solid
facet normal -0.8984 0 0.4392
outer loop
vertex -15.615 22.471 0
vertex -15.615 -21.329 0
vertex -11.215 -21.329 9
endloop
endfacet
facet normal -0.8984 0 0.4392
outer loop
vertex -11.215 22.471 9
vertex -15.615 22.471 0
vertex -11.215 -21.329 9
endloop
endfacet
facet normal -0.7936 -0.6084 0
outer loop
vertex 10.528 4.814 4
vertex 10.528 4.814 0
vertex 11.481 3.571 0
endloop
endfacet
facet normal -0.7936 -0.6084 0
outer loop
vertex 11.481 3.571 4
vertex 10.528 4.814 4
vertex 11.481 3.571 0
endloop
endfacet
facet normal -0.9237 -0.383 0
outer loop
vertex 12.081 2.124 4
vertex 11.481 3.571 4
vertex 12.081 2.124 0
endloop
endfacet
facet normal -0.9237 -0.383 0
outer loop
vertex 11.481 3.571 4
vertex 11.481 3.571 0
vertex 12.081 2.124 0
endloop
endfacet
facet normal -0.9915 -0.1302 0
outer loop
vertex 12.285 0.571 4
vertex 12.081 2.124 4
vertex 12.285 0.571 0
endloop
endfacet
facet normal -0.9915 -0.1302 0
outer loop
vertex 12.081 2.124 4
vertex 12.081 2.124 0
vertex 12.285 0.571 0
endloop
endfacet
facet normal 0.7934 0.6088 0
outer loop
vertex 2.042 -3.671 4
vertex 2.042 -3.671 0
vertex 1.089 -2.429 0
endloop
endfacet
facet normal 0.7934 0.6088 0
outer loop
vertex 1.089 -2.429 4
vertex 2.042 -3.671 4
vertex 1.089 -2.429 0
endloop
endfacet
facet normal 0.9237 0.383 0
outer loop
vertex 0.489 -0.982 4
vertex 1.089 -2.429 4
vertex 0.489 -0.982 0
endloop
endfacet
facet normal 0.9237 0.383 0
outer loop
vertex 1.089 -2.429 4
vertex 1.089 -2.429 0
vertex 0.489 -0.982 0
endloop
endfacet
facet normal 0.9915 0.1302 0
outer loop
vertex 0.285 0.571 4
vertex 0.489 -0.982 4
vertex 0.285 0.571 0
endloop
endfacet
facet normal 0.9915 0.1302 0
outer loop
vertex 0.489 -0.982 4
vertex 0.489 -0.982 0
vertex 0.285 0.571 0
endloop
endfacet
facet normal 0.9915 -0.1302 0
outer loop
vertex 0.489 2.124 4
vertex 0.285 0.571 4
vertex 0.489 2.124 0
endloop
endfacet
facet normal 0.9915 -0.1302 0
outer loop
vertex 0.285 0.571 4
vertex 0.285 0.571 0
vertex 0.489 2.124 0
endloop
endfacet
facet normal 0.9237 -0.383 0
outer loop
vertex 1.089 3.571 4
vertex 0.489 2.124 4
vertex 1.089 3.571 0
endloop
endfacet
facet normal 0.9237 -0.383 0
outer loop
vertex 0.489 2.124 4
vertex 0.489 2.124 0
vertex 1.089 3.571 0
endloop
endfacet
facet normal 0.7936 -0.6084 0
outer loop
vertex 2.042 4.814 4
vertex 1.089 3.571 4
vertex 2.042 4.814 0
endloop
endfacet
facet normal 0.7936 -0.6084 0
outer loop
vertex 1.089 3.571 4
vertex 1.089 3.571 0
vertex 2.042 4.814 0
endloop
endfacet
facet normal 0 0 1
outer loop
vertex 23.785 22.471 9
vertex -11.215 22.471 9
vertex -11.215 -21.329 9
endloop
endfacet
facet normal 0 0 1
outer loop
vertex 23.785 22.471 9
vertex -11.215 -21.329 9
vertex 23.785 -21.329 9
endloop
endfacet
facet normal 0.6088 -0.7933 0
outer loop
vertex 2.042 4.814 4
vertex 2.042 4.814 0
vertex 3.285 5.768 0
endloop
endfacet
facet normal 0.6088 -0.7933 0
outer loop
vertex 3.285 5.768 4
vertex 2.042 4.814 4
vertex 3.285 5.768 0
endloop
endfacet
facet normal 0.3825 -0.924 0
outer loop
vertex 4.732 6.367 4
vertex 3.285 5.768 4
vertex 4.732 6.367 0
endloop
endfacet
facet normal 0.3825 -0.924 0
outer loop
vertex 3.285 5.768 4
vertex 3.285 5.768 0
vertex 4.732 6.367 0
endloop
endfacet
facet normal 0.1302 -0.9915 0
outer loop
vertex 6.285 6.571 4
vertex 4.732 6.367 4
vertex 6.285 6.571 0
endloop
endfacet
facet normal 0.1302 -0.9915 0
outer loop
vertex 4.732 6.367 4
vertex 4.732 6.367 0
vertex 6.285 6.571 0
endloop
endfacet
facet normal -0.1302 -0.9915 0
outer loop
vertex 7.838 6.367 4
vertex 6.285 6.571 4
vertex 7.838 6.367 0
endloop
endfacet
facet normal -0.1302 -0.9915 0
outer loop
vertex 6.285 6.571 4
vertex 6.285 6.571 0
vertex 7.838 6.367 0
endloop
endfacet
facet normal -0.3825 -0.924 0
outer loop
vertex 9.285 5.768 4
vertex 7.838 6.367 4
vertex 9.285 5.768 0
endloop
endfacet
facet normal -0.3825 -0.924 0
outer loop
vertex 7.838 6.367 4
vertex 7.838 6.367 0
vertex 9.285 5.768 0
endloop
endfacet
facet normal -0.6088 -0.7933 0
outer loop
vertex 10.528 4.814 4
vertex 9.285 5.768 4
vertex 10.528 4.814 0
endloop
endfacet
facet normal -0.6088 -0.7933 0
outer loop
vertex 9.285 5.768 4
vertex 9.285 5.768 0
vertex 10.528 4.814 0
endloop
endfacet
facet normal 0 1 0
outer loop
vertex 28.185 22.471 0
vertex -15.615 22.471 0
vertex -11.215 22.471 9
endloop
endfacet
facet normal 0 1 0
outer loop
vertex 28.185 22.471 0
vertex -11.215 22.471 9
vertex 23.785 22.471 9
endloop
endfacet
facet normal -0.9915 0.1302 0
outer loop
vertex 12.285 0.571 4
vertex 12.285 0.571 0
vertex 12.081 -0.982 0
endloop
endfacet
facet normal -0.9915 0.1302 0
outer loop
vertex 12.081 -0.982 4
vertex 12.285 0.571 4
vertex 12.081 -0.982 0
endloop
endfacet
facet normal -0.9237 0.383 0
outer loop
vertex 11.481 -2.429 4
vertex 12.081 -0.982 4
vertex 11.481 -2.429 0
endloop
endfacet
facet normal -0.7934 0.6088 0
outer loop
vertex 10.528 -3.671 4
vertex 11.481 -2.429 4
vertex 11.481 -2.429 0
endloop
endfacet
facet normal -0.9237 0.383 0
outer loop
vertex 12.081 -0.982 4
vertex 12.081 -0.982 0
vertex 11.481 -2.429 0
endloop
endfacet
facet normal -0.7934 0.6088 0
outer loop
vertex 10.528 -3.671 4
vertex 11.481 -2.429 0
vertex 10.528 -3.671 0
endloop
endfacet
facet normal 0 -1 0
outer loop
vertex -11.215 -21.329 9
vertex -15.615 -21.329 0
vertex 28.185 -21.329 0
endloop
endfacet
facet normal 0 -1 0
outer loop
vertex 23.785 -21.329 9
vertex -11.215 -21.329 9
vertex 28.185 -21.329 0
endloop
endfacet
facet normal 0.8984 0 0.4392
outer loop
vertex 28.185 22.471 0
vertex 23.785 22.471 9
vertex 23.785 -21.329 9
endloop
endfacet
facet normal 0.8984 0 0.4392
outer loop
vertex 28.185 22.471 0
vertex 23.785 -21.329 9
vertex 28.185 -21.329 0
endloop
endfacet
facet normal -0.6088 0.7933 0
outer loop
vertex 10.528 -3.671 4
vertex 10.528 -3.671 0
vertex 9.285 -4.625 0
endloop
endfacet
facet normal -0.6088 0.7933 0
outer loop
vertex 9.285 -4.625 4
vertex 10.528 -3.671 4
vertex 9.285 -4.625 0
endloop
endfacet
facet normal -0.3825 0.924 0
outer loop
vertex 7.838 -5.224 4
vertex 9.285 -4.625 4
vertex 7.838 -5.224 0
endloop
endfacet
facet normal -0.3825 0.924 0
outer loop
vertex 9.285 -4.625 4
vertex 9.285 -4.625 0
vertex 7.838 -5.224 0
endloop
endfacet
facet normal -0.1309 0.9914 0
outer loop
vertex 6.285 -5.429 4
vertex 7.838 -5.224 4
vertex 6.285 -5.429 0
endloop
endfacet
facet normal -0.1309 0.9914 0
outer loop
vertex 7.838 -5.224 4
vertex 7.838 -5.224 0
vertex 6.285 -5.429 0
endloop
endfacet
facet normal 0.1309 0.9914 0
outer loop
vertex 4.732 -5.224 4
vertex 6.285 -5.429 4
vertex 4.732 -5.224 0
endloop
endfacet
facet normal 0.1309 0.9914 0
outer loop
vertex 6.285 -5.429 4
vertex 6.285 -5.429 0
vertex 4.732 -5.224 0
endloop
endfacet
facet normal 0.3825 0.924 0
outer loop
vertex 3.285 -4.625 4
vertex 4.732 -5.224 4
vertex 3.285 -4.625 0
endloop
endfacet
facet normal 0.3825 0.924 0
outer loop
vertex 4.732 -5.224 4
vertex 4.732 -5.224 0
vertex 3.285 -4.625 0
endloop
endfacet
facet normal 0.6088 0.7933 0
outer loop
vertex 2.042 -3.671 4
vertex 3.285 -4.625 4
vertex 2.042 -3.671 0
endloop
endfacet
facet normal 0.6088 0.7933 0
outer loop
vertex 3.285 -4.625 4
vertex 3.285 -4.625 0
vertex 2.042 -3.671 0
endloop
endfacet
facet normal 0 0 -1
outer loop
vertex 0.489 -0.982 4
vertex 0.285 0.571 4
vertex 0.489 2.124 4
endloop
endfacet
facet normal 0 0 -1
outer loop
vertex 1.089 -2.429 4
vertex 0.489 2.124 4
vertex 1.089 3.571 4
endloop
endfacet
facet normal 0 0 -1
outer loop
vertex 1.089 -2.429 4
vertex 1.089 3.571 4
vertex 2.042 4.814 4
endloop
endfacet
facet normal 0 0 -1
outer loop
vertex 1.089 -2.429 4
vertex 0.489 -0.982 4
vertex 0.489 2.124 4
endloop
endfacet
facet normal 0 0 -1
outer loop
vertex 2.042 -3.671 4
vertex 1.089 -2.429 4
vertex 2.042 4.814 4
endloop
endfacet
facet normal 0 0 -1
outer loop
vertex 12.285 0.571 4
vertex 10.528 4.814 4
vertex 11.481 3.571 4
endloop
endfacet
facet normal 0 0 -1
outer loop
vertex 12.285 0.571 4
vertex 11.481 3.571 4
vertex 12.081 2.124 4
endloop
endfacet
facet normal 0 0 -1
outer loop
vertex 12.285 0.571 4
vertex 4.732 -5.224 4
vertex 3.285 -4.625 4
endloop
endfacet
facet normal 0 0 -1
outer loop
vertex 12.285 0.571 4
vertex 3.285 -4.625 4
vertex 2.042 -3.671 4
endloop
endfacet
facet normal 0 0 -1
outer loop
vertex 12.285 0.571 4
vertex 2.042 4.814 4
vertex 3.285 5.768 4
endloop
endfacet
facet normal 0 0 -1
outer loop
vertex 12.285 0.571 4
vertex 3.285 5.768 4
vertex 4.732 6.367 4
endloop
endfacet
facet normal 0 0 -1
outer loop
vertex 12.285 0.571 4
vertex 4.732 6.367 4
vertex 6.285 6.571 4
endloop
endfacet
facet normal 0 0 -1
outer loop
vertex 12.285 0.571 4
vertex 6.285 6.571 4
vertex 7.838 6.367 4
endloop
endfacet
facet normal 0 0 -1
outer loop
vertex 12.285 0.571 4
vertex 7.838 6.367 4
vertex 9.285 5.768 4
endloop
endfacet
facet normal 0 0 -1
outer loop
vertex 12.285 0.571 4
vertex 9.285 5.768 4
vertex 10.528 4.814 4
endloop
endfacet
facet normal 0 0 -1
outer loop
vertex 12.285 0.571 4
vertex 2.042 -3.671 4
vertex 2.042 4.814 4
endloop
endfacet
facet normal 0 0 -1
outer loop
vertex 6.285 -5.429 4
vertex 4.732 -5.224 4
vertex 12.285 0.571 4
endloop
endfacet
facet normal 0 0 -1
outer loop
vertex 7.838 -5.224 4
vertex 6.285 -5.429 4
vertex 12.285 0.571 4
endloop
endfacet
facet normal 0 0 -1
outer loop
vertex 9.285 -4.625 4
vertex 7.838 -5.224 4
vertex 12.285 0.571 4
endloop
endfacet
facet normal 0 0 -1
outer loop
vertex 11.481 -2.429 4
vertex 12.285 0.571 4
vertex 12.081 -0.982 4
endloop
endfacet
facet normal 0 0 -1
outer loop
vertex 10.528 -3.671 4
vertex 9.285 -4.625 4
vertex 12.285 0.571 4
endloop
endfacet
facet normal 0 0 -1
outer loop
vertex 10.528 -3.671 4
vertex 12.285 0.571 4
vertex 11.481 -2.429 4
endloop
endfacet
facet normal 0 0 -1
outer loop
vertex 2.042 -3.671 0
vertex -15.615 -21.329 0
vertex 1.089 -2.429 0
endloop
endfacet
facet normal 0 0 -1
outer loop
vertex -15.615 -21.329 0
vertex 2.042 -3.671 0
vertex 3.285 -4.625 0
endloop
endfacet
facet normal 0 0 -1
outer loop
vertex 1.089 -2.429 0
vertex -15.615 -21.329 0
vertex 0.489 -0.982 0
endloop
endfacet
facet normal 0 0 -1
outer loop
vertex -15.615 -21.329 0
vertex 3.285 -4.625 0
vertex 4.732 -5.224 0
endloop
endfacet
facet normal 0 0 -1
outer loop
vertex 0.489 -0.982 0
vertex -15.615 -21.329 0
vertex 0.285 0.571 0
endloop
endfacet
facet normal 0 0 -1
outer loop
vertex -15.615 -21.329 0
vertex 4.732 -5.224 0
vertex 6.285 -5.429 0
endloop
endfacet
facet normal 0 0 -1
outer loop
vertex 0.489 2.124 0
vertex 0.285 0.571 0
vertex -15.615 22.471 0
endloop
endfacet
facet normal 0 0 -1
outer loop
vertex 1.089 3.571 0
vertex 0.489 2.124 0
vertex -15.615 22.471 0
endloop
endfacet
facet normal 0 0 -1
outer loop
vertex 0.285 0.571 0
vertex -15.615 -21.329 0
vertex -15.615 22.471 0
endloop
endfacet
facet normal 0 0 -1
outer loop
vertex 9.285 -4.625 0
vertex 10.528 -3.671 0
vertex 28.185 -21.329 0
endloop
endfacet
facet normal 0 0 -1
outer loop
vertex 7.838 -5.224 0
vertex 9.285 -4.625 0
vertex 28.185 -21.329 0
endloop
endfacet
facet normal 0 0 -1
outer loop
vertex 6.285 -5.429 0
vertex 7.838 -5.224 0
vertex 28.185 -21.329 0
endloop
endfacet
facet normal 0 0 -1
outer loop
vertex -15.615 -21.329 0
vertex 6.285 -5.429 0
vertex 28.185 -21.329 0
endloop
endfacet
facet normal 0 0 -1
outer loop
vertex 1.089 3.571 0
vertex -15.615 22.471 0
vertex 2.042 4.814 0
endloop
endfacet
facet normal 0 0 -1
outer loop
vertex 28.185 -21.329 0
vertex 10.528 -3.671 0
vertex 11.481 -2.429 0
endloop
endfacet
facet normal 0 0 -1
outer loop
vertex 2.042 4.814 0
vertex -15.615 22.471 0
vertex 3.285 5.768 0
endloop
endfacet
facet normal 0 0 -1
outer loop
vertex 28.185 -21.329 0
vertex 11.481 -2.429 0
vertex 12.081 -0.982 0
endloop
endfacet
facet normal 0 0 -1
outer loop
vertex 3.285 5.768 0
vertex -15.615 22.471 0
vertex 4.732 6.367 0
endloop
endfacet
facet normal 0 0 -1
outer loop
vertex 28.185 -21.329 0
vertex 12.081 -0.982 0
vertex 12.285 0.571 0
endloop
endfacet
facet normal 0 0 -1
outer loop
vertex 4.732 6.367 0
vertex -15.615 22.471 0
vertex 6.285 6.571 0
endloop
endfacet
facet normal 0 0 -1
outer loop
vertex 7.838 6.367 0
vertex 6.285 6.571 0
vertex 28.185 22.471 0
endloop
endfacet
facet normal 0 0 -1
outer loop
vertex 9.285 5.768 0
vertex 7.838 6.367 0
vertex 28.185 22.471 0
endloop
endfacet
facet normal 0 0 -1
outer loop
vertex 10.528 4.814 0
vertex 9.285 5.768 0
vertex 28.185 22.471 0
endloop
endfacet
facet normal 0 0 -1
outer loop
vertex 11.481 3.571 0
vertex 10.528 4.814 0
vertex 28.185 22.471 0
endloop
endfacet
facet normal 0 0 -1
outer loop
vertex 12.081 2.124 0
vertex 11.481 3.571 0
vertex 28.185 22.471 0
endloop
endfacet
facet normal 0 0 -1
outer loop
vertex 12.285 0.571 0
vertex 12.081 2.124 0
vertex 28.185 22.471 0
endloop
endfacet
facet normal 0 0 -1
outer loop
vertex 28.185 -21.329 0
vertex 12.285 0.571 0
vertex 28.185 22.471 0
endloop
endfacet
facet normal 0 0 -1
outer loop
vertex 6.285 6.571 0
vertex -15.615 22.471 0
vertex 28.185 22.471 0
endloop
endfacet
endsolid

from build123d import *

# Parameters (mm, degrees)
F0_W     = 43.8
F0_H     = 43.8
F1_DEPTH = 9
F3_DEPTH = 43.8
F5_DEPTH = 4


with BuildPart() as f1:
    # F0 (on Top) → F1 (new body)
    with BuildSketch(Plane.XY):
        with Locations((6.28503, 0.571359)):
            Rectangle(F0_W, F0_H)
    extrude(amount=F1_DEPTH)

    # F2 (on face) → F3 (cut, through all)
    with BuildSketch(Plane.XZ.offset(21.328641)):
        Polygon((-15.61497, 0), (-11.21497, 9), (-15.61497, 9), align=None)
        Polygon((28.18503, 9), (23.78503, 9), (28.18503, 0), align=None)
    extrude(amount=-F3_DEPTH, mode=Mode.SUBTRACT)

    # F4 (on face) → F5 (cut)
    with BuildSketch(Plane(origin=(0, 0, 0), x_dir=(1, 0, 0), z_dir=(0, 0, -1))):
        with BuildLine():
            ThreePointArc((10.527671, -4.814), (11.828308, -2.86746), (12.28503, -0.571359))
            ThreePointArc((12.28503, -0.571359), (11.828308, 1.724742), (10.527671, 3.671282))
            Line((10.527671, 3.671282), (6.28503, -0.571359))
            Line((6.28503, -0.571359), (10.527671, -4.814))
        make_face()
        with BuildLine():
            Line((6.28503, -0.571359), (10.527671, 3.671282))
            ThreePointArc((10.527671, 3.671282), (6.28503, 5.428641), (2.04239, 3.671282))
            Line((2.04239, 3.671282), (6.28503, -0.571359))
        make_face()
        with BuildLine():
            ThreePointArc((2.04239, -4.814), (6.28503, -6.571359), (10.527671, -4.814))
            Line((10.527671, -4.814), (6.28503, -0.571359))
            Line((6.28503, -0.571359), (2.04239, -4.814))
        make_face()
        with BuildLine():
            Line((6.28503, -0.571359), (2.04239, 3.671282))
            ThreePointArc((2.04239, 3.671282), (0.28503, -0.571359), (2.04239, -4.814))
            Line((2.04239, -4.814), (6.28503, -0.571359))
        make_face()
    extrude(amount=-F5_DEPTH, mode=Mode.SUBTRACT)


solid = f1.part
